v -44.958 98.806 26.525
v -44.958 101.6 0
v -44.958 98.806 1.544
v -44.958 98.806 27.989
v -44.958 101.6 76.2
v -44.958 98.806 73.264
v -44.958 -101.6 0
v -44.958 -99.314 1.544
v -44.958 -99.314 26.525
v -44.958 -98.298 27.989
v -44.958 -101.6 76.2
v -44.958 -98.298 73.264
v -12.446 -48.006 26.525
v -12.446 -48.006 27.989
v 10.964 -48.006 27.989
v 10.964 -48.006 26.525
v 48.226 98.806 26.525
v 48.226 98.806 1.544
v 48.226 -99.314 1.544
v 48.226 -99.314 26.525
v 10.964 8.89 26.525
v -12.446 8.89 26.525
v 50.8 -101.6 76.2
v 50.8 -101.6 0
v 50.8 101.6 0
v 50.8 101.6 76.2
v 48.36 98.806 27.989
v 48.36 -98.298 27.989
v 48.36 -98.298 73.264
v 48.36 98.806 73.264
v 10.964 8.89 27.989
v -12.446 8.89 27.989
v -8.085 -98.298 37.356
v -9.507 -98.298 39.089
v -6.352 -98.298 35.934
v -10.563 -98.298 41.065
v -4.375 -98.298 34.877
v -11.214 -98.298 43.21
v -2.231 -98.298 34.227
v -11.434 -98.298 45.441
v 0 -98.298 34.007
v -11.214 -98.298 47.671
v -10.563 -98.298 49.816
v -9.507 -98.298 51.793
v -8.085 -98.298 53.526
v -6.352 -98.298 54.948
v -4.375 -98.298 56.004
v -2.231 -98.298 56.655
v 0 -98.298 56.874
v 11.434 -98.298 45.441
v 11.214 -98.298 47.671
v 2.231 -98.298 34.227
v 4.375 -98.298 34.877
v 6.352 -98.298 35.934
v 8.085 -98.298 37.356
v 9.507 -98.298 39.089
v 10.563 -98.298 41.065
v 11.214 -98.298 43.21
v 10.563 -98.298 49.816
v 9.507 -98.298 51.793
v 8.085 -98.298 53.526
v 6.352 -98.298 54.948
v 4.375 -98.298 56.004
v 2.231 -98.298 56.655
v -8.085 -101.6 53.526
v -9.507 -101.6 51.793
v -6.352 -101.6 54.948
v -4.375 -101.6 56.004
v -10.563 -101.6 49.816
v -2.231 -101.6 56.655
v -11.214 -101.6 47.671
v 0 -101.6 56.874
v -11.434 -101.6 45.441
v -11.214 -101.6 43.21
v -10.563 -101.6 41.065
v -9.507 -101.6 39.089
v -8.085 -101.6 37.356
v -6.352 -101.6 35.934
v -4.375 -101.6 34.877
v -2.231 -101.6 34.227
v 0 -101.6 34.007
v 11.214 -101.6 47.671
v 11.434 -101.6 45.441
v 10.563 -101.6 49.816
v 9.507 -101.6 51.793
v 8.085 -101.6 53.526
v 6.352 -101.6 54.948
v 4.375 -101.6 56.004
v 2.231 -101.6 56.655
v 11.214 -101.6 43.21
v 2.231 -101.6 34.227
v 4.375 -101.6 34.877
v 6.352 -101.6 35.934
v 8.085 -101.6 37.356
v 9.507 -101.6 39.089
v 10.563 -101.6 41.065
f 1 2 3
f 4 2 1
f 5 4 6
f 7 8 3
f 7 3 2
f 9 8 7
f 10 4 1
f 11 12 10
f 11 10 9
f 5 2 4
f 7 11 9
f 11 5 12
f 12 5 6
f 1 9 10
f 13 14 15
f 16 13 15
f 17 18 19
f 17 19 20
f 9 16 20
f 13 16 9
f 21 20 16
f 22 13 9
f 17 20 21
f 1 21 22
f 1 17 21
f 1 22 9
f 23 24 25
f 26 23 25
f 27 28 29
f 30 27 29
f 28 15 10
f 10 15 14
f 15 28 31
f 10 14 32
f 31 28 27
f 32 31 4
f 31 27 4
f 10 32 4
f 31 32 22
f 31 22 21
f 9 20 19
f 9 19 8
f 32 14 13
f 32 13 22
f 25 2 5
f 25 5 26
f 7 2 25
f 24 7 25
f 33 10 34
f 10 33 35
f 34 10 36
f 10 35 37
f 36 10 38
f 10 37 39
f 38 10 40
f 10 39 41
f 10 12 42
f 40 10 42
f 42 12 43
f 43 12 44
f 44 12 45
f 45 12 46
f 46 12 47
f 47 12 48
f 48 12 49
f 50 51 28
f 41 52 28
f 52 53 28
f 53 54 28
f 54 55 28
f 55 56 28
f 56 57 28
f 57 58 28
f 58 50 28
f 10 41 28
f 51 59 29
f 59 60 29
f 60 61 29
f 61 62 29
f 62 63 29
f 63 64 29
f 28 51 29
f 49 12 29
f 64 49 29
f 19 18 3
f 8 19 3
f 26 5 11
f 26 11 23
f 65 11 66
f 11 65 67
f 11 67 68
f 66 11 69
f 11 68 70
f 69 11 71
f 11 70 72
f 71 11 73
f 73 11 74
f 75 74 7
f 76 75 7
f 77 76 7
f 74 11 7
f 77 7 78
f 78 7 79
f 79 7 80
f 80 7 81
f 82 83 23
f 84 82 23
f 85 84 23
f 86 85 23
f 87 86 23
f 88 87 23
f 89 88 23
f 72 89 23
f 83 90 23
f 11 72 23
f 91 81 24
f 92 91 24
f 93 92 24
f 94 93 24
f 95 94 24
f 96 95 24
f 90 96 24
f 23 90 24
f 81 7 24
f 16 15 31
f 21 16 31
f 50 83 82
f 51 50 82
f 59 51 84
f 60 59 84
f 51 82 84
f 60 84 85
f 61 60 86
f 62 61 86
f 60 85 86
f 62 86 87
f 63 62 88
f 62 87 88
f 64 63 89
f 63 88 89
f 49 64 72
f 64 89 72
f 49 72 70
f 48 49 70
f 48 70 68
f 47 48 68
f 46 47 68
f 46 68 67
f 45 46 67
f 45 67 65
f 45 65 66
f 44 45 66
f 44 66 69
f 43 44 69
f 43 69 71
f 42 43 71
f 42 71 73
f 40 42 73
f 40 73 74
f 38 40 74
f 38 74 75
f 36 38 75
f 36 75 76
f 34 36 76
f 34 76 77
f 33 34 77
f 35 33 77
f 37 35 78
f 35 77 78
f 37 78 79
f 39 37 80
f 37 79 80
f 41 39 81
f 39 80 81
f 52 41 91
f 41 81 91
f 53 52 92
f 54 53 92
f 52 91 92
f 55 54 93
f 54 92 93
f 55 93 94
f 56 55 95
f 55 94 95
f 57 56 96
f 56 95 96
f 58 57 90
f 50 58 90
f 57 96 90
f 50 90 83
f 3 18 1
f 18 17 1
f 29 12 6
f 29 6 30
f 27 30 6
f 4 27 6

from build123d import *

# Parameters (mm, degrees)
F0_W           = 101.6
F0_H           = 203.2
F1_DEPTH       = 76.2
F2_W           = 96.435938
F2_H           = 70.576824
F3_DEPTH       = 258.572
F4_W           = 101.6
F4_H           = 76.2
F5_DEPTH       = 3.302
F6_R           = 11.433627
F7_DEPTH       = 25.4
F8_W           = 100.535084
F8_H           = 27.989352
F9_DEPTH       = 203.2
F10_W          = 96.052602
F10_H          = 24.980713
F11_DEPTH      = 200.914
F12_W          = 23.410334
F12_H          = 56.895998
F13_DEPTH      = 9.652
F13_DEPTH_BACK = 11.938
F14_W          = 233.204983
F14_H          = 100.407705
F15_DEPTH      = 5.842
F16_W          = 95.758
F16_H          = 76.2
F17_DEPTH      = 2.794


with BuildPart() as f1:
    # F0 (on Top) → F1 (new body)
    with BuildSketch(Plane.XY):
        Rectangle(F0_W, F0_H)
    extrude(amount=F1_DEPTH)

    # F2 (on face) → F3 (cut)
    with BuildSketch(Plane.XZ.offset(101.6)):
        with Locations((0.141935, 37.975889)):
            Rectangle(F2_W, F2_H)
    extrude(amount=-F3_DEPTH, mode=Mode.SUBTRACT)

    # F4 (on face) → F5 (join)
    with BuildSketch(Plane.XZ.offset(101.6)):
        with Locations((0, 38.1)):
            Rectangle(F4_W, F4_H)
    extrude(amount=-F5_DEPTH)

    # F6 (on face) → F7 (cut)
    with BuildSketch(Plane.XZ.offset(101.6)):
        with Locations((0, 45.440793)):
            Circle(F6_R)
    extrude(amount=-F7_DEPTH, mode=Mode.SUBTRACT)

    # F8 (on face) → F9 (join)
    with BuildSketch(Plane(origin=(0, 101.6, 0), x_dir=(-1, 0, 0), z_dir=(0, 1, 0))):
        with Locations((-0.532458, 13.994676)):
            Rectangle(F8_W, F8_H)
    extrude(amount=-F9_DEPTH)

    # F10 (on face) → F11 (cut)
    with BuildSketch(Plane(origin=(0, 101.6, 0), x_dir=(-1, 0, 0), z_dir=(0, 1, 0))):
        with Locations((-0.199899, 14.034254)):
            Rectangle(F10_W, F10_H)
    extrude(amount=-F11_DEPTH, mode=Mode.SUBTRACT)

    # F12 (on face) → F13 (cut, two sides)
    with BuildSketch(Plane.XY.offset(27.989352)) as f13_sk:
        with Locations((-0.740831, -19.557999)):
            Rectangle(F12_W, F12_H)
    extrude(amount=-F13_DEPTH, mode=Mode.SUBTRACT)
    extrude(f13_sk.sketch, amount=-F13_DEPTH_BACK, mode=Mode.SUBTRACT)

    # F14 (on face) → F15 (cut)
    with BuildSketch(Plane(origin=(-50.8, 0, 0), x_dir=(0, -1, 0), z_dir=(-1, 0, 0))):
        with Locations((6.751563, 32.170609)):
            Rectangle(F14_W, F14_H)
    extrude(amount=-F15_DEPTH, mode=Mode.SUBTRACT)

    # F16 (on face) → F17 (join)
    with BuildSketch(Plane(origin=(0, 101.6, 0), x_dir=(-1, 0, 0), z_dir=(0, 1, 0))):
        with Locations((-2.921, 38.1)):
            Rectangle(F16_W, F16_H)
    extrude(amount=-F17_DEPTH)


solid = f1.part
